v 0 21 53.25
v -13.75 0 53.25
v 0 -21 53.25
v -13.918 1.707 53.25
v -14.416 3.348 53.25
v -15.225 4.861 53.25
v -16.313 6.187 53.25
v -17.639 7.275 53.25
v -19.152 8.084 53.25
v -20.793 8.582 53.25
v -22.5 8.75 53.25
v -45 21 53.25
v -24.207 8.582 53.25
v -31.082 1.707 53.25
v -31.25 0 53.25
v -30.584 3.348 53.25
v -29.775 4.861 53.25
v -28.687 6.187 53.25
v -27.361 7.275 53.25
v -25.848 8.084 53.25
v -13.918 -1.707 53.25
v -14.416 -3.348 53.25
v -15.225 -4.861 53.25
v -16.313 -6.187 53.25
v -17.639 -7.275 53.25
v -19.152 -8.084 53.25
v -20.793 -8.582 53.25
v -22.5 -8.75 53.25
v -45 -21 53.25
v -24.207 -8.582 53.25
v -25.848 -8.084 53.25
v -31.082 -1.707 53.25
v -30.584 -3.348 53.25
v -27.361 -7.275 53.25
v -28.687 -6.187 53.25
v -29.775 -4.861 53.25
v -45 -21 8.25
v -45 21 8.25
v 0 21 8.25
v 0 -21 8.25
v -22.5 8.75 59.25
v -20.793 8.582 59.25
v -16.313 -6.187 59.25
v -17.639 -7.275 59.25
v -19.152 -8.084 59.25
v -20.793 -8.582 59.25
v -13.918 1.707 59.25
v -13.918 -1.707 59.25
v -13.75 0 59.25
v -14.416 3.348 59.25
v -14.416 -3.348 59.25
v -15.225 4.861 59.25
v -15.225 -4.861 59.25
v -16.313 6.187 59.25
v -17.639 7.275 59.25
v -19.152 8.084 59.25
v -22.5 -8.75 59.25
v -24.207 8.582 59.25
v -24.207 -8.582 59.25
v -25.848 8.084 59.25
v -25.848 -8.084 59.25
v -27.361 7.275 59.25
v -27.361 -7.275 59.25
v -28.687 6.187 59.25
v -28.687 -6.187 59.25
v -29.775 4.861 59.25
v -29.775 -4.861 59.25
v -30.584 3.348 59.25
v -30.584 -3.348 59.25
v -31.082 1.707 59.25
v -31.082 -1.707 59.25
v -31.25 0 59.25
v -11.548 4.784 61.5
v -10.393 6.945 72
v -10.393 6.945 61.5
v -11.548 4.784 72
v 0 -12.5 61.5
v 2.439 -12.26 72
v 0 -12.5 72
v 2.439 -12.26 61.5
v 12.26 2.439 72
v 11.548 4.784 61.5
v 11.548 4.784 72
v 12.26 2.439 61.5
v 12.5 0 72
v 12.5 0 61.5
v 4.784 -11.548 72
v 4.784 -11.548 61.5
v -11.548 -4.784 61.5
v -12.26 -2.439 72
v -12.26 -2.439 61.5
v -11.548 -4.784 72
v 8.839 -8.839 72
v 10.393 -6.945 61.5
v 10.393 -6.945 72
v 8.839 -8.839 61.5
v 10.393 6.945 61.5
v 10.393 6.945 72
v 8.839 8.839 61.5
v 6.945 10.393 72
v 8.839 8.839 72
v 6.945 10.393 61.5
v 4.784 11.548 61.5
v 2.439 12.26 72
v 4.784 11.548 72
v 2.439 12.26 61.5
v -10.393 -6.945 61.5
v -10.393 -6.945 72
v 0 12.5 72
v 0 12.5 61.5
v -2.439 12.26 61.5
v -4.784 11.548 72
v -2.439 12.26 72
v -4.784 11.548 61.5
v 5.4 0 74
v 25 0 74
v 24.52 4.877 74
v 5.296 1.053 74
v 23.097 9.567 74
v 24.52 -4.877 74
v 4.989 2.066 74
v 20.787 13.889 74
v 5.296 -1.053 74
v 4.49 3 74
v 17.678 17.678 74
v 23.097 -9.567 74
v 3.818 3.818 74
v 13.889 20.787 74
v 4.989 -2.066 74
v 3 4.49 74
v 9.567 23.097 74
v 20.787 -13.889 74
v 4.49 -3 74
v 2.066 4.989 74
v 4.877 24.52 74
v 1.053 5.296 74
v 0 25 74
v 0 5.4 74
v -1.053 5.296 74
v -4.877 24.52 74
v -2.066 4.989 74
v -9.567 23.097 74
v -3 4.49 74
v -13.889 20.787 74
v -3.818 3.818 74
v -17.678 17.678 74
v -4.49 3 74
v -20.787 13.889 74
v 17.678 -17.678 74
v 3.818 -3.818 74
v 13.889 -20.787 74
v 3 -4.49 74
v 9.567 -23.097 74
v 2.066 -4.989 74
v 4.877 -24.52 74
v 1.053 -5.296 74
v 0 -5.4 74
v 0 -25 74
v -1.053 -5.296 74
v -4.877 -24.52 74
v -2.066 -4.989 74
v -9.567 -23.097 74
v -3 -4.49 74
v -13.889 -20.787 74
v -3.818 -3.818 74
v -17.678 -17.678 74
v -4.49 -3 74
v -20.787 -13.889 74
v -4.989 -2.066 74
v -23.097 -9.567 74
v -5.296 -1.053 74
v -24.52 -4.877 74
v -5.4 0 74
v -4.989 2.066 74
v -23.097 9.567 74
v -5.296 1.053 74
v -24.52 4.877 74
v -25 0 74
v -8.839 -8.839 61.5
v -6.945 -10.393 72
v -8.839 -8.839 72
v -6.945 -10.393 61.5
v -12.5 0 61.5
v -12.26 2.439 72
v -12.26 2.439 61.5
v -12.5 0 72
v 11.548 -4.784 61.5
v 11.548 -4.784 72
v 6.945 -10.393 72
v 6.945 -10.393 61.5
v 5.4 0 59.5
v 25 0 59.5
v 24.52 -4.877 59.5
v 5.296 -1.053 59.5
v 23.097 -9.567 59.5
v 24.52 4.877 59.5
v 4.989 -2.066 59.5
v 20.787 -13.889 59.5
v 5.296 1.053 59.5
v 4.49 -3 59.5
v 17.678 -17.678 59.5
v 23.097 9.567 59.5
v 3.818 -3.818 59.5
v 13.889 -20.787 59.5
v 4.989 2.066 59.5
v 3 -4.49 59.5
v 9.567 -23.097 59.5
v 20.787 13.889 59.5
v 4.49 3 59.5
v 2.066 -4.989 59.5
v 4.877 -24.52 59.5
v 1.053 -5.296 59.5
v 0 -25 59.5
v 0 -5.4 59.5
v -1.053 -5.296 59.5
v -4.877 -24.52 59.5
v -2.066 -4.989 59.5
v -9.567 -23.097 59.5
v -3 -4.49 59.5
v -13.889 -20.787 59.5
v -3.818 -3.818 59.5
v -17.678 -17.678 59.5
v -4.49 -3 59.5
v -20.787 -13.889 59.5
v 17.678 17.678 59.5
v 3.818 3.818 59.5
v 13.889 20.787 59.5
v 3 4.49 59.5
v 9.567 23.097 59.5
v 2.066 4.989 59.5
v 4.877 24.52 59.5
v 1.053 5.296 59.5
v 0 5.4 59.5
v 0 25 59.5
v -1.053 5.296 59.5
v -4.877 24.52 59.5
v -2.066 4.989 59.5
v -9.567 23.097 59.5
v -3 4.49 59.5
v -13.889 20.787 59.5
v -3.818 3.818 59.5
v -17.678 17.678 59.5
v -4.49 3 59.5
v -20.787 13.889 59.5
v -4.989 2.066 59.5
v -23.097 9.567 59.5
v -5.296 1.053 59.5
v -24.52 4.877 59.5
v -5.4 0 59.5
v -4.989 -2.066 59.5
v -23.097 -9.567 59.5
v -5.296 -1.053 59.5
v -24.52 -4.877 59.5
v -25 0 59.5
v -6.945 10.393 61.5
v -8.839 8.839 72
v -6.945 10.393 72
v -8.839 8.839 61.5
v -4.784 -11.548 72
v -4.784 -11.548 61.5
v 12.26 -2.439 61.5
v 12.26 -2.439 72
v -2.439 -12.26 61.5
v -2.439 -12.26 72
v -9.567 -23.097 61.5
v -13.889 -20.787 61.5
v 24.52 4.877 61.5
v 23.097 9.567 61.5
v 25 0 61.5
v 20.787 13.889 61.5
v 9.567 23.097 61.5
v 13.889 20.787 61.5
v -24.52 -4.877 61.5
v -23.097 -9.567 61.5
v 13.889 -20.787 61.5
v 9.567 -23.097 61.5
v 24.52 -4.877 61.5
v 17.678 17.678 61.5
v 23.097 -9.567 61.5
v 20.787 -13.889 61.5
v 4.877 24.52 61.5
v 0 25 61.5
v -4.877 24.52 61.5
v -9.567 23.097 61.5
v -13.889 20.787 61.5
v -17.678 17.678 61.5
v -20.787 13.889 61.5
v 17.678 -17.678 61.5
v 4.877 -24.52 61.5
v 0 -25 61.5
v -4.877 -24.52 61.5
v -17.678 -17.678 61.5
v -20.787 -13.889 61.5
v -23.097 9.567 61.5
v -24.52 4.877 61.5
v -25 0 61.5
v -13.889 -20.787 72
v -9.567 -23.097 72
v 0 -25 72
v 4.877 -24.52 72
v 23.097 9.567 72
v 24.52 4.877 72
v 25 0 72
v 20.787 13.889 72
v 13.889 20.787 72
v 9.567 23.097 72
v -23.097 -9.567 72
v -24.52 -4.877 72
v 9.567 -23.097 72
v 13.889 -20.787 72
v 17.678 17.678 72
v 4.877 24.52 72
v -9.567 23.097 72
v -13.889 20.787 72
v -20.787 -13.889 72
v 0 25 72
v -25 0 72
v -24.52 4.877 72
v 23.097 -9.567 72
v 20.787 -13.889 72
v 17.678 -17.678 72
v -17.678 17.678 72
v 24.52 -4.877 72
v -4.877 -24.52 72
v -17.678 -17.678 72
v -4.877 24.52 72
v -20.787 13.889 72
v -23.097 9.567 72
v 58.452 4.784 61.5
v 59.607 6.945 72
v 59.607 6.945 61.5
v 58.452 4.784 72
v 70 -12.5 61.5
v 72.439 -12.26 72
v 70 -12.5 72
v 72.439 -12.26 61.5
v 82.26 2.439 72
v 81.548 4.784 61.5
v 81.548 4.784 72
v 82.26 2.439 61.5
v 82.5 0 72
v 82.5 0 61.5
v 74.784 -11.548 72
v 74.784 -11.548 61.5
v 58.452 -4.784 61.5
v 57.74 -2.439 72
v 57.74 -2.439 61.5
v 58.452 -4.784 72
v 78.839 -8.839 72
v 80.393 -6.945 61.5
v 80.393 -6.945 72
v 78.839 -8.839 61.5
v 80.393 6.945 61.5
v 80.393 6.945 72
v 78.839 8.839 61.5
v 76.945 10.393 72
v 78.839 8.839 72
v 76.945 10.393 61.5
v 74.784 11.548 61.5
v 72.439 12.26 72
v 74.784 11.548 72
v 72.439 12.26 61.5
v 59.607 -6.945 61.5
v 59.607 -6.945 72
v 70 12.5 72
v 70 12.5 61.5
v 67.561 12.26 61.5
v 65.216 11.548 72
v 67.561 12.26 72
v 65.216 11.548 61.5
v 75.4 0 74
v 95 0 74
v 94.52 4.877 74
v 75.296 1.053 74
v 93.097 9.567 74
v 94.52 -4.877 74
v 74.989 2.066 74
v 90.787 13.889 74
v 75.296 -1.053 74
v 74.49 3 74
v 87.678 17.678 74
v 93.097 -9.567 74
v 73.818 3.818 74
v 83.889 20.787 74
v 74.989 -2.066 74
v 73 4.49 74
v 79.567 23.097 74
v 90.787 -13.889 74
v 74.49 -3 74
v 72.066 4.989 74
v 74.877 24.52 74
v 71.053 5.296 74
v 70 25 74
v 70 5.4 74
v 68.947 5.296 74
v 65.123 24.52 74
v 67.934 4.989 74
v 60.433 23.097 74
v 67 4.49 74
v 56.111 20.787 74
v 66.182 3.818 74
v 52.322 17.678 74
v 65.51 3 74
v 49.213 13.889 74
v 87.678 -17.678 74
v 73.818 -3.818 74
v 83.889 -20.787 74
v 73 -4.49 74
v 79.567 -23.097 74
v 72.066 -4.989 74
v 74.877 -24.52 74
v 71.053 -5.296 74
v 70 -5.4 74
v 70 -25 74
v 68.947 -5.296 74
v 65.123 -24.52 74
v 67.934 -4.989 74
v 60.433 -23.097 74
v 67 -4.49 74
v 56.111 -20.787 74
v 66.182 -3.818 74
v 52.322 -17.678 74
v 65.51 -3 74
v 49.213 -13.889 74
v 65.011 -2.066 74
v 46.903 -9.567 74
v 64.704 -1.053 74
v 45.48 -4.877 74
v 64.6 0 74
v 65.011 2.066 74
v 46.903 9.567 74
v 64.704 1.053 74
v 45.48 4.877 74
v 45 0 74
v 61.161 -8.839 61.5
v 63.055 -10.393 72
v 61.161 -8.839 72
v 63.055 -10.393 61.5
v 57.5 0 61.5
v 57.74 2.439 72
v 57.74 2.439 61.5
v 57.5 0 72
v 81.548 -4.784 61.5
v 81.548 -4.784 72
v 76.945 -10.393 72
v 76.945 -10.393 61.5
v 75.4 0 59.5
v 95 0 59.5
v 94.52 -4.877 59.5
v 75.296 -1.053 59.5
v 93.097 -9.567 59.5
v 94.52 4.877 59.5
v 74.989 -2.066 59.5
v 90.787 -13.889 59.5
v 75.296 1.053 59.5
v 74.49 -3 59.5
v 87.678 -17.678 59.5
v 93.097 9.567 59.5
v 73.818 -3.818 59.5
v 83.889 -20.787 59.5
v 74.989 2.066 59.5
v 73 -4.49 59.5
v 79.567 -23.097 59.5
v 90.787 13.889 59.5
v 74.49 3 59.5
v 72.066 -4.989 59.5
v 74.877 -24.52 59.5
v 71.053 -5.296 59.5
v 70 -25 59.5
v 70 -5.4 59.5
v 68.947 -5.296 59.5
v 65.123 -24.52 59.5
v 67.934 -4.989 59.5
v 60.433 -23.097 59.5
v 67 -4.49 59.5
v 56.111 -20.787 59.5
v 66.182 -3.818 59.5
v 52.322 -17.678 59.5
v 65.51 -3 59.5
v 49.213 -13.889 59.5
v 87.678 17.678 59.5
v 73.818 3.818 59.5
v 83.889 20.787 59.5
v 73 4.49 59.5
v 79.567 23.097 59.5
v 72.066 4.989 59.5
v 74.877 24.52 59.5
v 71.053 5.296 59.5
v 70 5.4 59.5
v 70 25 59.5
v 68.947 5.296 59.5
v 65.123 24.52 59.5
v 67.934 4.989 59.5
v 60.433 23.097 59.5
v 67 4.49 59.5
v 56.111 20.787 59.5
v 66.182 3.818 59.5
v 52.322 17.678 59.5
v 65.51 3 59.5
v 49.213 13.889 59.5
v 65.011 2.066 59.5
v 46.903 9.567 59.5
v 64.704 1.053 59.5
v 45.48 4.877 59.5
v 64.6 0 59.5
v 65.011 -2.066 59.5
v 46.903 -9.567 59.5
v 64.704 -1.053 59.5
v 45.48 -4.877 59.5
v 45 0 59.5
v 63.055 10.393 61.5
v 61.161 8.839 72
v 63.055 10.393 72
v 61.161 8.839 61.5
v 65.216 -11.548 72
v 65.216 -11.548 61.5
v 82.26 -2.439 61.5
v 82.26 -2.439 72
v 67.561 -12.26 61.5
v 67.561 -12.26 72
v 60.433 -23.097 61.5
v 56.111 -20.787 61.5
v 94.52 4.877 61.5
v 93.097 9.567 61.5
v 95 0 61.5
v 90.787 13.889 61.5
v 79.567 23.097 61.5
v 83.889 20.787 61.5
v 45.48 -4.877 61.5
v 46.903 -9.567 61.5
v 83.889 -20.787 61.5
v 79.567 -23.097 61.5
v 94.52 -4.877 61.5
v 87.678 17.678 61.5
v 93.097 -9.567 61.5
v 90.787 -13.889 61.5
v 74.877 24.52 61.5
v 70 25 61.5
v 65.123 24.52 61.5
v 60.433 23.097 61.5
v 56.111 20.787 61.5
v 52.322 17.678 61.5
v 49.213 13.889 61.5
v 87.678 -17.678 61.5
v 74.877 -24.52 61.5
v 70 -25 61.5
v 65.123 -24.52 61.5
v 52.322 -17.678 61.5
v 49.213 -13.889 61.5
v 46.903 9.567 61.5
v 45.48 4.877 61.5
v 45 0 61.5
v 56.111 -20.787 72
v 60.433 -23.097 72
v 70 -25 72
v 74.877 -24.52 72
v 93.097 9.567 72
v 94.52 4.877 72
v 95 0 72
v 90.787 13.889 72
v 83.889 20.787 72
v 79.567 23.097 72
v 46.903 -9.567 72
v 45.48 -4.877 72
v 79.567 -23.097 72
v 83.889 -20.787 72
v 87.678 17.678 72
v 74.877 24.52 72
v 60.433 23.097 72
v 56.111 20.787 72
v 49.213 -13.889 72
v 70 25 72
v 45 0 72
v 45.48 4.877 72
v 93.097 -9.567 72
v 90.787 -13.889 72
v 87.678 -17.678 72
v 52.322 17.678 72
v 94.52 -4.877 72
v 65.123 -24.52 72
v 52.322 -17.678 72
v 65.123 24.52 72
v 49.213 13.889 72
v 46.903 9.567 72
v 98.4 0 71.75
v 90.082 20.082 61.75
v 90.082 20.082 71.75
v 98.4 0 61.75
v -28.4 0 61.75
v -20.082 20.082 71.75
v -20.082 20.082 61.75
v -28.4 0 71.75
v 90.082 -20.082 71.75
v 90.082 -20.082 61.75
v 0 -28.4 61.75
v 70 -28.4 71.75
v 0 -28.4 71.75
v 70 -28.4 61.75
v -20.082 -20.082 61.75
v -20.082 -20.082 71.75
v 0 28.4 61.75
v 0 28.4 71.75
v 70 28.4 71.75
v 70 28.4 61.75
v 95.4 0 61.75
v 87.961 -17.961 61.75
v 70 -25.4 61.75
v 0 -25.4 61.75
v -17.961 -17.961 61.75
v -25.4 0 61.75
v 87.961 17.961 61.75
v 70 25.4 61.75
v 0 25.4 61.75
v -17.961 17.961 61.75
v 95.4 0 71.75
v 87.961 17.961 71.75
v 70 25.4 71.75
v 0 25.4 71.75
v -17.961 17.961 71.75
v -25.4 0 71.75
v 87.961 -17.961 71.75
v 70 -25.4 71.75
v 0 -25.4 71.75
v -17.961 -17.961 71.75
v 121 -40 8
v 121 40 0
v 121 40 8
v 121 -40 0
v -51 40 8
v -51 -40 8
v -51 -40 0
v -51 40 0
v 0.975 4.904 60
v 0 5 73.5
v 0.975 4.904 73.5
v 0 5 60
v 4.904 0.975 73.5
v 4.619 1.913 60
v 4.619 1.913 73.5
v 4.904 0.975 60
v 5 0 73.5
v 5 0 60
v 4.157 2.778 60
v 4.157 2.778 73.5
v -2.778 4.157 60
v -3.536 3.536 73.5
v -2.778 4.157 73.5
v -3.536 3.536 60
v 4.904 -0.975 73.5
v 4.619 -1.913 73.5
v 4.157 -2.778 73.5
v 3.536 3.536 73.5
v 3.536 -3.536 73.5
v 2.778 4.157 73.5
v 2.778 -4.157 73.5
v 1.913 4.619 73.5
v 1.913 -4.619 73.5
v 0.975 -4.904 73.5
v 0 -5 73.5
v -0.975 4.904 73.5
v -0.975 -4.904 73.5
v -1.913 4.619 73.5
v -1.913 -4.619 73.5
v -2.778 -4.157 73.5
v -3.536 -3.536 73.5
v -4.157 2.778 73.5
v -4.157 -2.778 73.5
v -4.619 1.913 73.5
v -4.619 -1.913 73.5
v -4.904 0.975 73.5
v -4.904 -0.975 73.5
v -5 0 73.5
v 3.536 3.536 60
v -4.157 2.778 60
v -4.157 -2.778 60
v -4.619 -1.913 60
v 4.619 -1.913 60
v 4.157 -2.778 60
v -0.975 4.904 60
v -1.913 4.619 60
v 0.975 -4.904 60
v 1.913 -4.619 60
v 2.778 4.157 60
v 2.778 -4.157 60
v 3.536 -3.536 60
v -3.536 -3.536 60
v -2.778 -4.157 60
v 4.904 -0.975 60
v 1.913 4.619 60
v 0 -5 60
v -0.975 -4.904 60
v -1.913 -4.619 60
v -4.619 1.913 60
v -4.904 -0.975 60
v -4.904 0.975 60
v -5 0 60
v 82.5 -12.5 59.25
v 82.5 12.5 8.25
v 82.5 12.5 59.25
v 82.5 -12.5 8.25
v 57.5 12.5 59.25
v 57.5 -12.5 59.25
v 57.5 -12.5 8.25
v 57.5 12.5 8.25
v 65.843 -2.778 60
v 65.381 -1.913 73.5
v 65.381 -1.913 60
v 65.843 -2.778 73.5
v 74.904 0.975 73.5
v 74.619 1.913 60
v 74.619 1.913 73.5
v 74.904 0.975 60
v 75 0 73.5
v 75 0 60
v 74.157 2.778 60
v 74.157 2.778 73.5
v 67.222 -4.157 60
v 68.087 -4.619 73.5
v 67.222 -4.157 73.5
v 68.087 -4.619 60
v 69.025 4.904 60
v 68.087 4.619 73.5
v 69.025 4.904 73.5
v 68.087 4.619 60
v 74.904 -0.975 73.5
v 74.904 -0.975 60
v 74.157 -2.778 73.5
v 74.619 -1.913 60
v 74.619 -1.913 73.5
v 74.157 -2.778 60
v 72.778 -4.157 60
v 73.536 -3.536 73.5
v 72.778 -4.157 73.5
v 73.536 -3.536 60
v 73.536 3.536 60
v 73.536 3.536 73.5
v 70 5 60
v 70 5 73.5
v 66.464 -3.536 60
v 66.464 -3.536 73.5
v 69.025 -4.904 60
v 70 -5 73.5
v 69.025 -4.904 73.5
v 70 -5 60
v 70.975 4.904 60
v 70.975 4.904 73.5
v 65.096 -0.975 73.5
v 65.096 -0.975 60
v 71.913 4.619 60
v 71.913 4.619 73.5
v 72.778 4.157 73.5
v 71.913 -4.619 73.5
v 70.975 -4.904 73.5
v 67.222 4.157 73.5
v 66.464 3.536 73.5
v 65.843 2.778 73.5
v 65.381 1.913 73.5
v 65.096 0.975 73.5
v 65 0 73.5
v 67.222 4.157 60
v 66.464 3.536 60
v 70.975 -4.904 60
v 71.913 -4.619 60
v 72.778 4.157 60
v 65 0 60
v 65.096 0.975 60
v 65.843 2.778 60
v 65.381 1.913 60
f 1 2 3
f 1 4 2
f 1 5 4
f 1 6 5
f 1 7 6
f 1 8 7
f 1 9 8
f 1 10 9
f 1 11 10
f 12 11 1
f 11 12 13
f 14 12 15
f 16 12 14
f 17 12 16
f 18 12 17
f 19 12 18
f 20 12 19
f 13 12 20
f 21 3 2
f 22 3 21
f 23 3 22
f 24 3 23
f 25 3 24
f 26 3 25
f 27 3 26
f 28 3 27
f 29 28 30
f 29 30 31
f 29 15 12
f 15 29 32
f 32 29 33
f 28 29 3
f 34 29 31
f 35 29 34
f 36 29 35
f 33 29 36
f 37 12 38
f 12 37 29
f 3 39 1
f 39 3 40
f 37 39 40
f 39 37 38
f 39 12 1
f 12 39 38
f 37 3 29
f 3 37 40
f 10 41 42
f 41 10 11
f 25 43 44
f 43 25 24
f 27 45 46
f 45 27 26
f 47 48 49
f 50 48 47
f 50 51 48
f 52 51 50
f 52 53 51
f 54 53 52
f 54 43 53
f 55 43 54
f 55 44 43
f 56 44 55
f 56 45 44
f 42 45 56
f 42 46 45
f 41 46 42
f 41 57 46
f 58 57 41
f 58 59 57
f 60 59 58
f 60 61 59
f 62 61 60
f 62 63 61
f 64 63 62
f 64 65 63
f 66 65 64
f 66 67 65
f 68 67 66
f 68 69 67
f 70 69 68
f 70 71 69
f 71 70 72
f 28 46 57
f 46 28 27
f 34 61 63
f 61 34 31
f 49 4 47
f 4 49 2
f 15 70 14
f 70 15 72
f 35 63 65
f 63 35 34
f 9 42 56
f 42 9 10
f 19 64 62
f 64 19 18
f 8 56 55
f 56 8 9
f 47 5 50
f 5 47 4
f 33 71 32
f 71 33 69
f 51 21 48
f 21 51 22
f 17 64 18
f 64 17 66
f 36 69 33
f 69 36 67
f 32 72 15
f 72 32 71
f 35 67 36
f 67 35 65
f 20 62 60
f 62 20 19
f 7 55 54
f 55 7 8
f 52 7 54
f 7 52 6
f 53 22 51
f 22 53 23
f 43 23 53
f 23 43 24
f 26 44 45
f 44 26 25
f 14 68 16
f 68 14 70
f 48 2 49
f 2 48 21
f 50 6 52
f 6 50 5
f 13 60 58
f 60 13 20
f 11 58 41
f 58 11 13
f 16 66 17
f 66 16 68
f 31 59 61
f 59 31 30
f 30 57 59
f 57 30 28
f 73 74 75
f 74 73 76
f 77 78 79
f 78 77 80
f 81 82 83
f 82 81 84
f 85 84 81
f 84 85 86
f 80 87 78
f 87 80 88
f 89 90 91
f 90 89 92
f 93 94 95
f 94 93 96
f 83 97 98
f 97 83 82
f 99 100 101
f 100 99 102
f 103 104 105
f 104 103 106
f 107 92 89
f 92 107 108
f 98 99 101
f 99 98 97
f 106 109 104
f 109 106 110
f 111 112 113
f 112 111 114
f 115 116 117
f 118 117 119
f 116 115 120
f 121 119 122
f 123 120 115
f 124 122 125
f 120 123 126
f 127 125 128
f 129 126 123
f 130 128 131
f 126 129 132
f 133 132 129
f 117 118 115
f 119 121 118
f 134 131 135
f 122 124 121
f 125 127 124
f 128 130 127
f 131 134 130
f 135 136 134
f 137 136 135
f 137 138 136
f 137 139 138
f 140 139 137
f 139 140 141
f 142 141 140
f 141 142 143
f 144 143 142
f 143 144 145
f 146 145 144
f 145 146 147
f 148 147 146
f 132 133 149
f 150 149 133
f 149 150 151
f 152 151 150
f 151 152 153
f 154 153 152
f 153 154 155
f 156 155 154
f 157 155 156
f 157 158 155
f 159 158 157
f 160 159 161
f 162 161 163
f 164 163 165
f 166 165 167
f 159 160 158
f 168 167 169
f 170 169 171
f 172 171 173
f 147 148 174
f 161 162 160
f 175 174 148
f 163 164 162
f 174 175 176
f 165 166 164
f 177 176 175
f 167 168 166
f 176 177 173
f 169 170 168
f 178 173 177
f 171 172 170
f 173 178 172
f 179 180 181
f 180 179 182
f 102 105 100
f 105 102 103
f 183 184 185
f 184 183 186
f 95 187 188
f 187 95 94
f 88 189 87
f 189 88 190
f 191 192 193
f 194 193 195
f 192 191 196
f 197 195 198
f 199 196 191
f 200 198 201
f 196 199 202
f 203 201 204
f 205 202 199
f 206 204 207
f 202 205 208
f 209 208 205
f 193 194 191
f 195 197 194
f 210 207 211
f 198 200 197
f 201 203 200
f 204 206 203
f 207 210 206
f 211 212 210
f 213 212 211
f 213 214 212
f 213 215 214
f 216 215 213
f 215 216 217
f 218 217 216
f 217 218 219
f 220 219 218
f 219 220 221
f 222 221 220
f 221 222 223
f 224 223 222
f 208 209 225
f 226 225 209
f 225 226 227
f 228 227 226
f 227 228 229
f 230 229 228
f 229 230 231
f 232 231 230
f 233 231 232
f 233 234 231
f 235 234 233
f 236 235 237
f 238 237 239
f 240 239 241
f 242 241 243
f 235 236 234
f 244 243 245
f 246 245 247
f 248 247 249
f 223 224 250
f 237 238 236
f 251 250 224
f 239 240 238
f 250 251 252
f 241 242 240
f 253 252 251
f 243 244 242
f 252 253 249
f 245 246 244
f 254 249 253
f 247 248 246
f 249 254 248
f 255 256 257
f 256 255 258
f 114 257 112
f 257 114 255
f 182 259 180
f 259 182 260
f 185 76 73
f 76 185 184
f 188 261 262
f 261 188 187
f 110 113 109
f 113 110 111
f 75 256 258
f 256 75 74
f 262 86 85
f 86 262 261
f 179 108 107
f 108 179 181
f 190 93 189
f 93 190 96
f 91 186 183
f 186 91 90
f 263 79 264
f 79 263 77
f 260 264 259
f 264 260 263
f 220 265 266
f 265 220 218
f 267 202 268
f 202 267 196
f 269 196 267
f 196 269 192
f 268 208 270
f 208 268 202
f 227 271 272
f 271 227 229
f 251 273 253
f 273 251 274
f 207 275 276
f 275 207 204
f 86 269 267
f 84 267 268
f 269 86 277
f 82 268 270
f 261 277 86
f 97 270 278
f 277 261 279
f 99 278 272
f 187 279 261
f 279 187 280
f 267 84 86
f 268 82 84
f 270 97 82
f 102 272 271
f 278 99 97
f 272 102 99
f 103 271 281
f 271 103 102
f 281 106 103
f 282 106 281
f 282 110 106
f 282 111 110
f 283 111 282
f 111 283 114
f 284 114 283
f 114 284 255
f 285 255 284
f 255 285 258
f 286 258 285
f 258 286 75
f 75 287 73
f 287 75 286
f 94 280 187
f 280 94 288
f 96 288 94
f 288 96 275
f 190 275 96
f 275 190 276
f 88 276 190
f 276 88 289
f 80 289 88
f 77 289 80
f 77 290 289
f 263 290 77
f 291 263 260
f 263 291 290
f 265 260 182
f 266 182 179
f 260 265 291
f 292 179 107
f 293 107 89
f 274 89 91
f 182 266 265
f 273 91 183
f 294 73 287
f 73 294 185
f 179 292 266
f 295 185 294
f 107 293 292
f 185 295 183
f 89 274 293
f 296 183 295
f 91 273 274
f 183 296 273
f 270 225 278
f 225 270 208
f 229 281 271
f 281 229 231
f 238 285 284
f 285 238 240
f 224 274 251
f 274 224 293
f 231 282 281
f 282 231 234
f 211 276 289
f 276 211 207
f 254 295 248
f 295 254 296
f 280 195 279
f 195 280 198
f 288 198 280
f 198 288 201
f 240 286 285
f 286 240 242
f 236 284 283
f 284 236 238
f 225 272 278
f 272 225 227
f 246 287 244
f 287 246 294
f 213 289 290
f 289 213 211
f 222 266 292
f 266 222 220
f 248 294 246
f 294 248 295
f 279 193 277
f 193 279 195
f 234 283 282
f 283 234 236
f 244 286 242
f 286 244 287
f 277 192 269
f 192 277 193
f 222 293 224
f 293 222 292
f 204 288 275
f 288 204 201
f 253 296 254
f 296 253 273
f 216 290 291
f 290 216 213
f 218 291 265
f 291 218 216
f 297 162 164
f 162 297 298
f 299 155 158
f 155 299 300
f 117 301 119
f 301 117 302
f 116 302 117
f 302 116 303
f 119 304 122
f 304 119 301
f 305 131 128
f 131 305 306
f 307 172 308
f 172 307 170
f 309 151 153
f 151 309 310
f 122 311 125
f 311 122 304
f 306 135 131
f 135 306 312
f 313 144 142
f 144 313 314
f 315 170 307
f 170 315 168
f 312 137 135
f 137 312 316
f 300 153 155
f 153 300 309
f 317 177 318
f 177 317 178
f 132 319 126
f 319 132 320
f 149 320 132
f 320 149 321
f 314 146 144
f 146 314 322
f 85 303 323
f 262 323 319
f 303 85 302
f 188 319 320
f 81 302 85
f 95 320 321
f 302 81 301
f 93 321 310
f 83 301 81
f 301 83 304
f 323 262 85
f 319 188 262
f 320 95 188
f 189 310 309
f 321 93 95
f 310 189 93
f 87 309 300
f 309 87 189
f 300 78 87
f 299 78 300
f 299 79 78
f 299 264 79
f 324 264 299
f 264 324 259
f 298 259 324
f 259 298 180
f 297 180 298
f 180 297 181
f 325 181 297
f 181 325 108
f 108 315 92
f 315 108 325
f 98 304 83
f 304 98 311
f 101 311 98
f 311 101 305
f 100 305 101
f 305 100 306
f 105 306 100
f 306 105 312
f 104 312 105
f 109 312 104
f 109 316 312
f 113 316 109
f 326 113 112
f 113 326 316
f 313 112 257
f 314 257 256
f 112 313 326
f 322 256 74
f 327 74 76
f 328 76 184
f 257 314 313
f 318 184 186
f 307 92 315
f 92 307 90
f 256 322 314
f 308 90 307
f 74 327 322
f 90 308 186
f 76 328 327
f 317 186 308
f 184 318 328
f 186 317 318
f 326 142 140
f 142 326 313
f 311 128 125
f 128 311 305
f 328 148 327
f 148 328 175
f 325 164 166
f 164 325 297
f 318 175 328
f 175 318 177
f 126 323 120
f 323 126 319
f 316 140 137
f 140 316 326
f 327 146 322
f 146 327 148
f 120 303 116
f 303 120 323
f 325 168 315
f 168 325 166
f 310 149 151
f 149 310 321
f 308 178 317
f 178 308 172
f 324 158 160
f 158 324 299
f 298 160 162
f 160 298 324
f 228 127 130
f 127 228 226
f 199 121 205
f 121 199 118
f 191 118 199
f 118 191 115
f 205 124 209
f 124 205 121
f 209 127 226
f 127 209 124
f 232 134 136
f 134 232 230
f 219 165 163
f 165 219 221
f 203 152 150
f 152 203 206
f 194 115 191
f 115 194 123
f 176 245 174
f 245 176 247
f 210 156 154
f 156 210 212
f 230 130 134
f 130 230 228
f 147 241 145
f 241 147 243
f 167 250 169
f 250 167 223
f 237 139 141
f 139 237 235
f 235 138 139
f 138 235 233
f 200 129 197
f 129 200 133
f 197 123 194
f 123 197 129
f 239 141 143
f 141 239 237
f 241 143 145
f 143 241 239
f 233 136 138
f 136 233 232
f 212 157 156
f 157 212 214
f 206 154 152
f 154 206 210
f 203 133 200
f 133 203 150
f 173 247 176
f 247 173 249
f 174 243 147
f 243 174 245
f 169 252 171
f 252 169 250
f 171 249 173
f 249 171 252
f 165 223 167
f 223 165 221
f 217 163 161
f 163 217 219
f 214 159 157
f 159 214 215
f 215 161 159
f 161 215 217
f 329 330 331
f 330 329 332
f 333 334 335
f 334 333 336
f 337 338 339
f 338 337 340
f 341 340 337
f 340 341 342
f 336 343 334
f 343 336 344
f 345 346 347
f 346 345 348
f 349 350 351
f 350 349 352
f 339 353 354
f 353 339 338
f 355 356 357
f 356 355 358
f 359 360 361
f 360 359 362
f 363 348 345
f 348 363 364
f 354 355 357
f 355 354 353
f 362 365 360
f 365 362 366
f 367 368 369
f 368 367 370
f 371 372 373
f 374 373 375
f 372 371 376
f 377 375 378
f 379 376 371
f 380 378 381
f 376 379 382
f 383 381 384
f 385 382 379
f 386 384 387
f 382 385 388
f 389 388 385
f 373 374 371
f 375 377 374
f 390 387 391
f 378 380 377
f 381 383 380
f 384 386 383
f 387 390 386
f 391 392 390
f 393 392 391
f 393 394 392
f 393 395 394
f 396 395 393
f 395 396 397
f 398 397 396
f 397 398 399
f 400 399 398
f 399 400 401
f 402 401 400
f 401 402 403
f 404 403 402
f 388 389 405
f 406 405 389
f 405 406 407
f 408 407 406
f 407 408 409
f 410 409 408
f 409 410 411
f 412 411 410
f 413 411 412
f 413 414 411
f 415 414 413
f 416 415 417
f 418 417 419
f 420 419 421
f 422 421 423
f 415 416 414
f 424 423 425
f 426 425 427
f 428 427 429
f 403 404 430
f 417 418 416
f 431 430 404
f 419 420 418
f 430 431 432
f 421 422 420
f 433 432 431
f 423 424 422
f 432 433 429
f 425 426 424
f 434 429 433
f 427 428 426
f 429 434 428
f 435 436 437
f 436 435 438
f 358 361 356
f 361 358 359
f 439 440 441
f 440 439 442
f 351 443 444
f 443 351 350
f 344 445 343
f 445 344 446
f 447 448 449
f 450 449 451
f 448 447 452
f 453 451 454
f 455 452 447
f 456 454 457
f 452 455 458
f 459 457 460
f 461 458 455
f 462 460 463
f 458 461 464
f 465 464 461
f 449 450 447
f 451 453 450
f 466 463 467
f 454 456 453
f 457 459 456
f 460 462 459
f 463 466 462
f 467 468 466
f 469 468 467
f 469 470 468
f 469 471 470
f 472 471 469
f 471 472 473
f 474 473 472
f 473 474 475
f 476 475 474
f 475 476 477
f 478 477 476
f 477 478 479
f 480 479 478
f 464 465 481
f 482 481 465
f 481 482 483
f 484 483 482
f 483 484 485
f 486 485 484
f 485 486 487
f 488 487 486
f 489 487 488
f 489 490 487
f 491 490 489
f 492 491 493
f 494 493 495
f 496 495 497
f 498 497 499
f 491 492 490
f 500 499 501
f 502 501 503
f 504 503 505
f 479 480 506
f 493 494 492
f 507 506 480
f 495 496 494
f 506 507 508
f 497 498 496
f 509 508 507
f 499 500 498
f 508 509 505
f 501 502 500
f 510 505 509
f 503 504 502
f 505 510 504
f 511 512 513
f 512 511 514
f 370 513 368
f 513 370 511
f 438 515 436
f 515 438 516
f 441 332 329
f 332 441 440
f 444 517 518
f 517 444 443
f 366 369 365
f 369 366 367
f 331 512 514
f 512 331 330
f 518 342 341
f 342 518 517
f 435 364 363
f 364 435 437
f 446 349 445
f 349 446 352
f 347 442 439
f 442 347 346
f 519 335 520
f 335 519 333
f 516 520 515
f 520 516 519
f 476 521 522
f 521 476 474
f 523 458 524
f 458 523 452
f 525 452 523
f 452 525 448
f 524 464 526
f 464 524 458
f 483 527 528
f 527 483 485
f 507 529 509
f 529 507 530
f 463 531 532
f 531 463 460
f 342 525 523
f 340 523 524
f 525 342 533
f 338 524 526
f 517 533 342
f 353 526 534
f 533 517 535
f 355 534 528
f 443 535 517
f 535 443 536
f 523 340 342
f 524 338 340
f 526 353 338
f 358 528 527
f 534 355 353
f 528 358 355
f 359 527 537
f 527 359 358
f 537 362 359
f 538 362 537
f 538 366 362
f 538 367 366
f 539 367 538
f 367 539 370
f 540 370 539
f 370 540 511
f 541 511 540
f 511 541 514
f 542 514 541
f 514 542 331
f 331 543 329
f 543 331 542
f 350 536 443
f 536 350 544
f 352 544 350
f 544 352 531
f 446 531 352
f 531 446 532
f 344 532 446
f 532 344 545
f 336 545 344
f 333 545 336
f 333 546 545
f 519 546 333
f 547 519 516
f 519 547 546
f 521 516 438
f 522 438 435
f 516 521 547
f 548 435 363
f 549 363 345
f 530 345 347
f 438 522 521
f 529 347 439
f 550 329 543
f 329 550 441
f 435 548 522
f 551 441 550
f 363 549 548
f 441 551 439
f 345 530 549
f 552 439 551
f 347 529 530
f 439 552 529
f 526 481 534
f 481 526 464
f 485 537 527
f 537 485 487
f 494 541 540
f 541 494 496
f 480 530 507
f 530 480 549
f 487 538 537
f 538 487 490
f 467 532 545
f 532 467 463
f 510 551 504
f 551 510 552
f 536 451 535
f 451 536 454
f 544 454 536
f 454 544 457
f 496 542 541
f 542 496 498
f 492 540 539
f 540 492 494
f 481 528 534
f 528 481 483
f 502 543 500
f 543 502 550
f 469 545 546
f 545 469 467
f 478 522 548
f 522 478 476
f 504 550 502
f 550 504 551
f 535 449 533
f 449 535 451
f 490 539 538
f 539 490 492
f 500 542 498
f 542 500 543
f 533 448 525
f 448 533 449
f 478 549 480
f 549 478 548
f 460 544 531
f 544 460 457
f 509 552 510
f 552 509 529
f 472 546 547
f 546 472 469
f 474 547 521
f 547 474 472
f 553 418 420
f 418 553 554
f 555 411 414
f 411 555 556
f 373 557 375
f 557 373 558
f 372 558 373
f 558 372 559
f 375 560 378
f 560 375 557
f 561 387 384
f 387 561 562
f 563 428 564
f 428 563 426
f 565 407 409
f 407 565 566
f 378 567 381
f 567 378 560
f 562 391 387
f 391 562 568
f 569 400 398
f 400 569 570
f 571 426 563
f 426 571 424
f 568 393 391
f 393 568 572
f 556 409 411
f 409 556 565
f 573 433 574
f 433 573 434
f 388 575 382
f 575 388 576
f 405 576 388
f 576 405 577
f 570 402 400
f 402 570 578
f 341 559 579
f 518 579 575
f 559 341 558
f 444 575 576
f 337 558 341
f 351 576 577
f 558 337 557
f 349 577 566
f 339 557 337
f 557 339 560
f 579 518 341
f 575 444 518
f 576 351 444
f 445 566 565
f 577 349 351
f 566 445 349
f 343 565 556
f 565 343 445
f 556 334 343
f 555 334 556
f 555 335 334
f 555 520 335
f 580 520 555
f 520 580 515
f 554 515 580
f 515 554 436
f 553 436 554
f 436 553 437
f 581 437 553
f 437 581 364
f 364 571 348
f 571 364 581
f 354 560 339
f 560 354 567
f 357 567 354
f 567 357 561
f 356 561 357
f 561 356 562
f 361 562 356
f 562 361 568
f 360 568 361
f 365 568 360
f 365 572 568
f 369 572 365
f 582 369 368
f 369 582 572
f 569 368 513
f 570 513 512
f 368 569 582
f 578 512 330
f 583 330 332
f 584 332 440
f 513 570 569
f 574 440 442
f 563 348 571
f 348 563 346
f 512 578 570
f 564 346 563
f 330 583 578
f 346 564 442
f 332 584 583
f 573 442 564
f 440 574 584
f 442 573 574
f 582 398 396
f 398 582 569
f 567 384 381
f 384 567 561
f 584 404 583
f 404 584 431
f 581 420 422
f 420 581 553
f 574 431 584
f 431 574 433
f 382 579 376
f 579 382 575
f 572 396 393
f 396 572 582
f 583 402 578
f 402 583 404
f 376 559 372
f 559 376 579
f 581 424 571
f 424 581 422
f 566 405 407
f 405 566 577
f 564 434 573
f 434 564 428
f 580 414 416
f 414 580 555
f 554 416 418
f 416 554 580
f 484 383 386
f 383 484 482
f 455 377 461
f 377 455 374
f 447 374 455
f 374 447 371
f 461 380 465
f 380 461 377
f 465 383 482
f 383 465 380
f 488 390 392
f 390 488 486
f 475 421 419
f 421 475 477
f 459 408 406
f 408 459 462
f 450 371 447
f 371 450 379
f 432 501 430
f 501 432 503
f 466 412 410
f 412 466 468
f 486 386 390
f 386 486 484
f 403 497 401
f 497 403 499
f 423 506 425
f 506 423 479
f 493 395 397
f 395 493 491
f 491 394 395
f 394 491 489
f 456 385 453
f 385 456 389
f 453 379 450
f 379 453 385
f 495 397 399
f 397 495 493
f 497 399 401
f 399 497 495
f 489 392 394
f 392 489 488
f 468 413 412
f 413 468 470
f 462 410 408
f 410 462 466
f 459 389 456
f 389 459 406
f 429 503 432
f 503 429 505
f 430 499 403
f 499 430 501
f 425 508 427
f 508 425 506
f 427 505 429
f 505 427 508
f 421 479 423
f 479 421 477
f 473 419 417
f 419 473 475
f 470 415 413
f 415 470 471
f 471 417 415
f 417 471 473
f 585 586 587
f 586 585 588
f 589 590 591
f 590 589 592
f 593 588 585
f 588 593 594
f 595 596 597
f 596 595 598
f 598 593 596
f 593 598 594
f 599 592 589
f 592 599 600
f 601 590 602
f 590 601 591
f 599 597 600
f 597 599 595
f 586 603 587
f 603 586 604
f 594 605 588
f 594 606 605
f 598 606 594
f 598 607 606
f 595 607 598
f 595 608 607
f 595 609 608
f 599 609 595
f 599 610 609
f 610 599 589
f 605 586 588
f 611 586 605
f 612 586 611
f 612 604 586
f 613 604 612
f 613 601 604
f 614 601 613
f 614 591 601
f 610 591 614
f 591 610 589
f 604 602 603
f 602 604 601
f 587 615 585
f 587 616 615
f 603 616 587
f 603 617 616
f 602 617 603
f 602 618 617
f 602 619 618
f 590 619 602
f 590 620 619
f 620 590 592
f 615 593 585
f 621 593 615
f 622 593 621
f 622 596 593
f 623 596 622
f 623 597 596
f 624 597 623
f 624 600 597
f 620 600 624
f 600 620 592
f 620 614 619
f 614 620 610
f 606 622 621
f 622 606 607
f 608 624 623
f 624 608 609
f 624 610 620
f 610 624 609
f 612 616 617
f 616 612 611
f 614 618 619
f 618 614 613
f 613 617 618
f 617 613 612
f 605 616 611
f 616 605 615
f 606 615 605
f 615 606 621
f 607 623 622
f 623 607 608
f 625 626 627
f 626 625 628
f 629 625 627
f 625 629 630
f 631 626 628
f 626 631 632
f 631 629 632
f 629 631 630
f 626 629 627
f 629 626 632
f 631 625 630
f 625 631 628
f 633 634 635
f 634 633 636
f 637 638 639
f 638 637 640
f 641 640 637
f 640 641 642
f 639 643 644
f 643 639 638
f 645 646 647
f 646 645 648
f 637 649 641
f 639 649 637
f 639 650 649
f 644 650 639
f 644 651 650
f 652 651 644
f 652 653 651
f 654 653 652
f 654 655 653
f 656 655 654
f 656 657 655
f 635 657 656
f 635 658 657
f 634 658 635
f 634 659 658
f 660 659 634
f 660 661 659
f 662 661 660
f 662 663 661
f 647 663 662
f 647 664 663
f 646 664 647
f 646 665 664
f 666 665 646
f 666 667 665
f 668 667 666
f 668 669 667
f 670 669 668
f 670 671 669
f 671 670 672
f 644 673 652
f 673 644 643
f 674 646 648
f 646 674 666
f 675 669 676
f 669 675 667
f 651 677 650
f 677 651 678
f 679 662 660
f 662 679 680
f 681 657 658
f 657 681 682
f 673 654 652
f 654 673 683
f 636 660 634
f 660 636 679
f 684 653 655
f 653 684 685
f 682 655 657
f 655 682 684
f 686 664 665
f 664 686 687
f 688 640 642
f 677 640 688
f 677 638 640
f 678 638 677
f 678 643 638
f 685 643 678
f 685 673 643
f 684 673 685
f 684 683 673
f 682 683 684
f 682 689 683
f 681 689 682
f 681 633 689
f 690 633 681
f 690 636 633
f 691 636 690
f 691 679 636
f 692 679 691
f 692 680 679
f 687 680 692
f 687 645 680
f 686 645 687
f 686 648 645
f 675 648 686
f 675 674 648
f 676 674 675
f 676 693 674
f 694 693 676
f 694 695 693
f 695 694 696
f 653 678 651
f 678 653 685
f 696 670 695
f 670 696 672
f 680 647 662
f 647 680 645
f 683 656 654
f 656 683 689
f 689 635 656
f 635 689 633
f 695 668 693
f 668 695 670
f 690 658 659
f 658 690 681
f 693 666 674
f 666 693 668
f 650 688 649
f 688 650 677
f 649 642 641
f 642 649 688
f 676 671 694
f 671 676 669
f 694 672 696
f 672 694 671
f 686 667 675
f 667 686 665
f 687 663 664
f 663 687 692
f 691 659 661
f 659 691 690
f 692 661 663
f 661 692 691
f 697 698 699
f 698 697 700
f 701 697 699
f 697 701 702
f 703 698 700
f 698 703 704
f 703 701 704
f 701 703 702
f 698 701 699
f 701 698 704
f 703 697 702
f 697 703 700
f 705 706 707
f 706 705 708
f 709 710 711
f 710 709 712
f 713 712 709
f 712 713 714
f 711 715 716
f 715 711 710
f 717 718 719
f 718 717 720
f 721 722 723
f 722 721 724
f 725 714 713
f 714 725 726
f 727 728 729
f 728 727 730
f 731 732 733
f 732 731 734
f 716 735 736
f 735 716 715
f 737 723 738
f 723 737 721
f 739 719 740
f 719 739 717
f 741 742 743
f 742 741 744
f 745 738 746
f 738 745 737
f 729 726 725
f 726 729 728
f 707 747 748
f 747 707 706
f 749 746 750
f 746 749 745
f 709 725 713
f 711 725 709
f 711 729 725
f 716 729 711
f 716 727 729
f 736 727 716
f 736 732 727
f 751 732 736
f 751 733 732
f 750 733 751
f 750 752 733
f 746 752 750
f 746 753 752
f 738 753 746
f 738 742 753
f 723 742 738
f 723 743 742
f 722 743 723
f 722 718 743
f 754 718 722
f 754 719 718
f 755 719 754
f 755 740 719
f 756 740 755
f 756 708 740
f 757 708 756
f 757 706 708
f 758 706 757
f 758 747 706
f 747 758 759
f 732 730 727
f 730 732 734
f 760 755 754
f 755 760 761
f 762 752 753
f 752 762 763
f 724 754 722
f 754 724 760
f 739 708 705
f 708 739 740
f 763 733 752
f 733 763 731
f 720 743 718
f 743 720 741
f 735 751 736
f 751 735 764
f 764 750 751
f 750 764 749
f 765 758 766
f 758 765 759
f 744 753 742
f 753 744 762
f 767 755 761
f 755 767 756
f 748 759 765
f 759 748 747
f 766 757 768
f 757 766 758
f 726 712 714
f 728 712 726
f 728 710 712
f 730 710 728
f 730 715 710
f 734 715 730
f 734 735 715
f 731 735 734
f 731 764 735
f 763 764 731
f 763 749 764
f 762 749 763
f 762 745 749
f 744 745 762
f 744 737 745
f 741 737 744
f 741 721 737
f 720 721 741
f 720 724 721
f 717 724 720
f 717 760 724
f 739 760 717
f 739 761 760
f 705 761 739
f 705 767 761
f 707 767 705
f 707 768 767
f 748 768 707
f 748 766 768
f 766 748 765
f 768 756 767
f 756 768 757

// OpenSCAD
$fn = 32;

// ------------------------------------------------------------------------
// Motor belt drive: span 70 mm, pulleys d50, belt 10 mm wide
// Every part is its own module, assembly() places every instance.
// ------------------------------------------------------------------------

// --- part 1 ---
module base_plate() {
  difference() {
    translate([-86, -40, 0]) cube([172, 80, 8]);
  }
}

// --- part 2 ---
module motor() {
  union() {
    translate([-22.5, -21, 0]) cube([45, 42, 45]);
    translate([25.5, 0, 22.5]) rotate([0, 90, 0]) cylinder(h = 6, d = 17.5, center = true);
  }
}

// --- part 3 ---
module drive_shaft() {
  translate([0, 0, -6.75]) cylinder(h = 13.5, d = 10);
}

// --- part 4 ---
module pulley_drive() {
  difference() {
    union() {
      cylinder(h = 14.5, d = 25);
      cylinder(h = 2, d = 50);
      translate([0, 0, 12.5]) cylinder(h = 2, d = 50);
    }
    translate([0, 0, -1]) cylinder(h = 16.5, d = 10.8);
  }
}

// --- part 5 ---
module idler_post() {
  translate([-12.5, -12.5, 0]) cube([25, 25, 51]);
}

// --- part 6 ---
module driven_shaft() {
  translate([0, 0, -6.75]) cylinder(h = 13.5, d = 10);
}

// --- part 7 ---
module pulley_driven() {
  difference() {
    union() {
      cylinder(h = 14.5, d = 25);
      cylinder(h = 2, d = 50);
      translate([0, 0, 12.5]) cylinder(h = 2, d = 50);
    }
    translate([0, 0, -1]) cylinder(h = 16.5, d = 10.8);
  }
}

// --- part 8 ---
module drive_belt() {
  difference() {
    linear_extrude(height = 10) polygon(points = concat([for (a = [90 : 45 : 270]) [28.4 * cos(a), 28.4 * sin(a)]], [for (a = [270 : 45 : 450]) [70 + 28.4 * cos(a), 28.4 * sin(a)]]));
    translate([0, 0, -1]) linear_extrude(height = 12) polygon(points = concat([for (a = [90 : 45 : 270]) [25.4 * cos(a), 25.4 * sin(a)]], [for (a = [270 : 45 : 450]) [70 + 25.4 * cos(a), 25.4 * sin(a)]]));
  }
}

// --- assembly ---
module assembly() {
  color([0.80, 0.24, 0.20]) translate([35, 0, 0]) rotate([0, 0, 0]) base_plate();
  color([0.20, 0.45, 0.75]) translate([0, 0, 30.75]) rotate([0, 270, 0]) motor();
  color([0.25, 0.62, 0.32]) translate([0, 0, 66.75]) rotate([0, 0, 0]) drive_shaft();
  color([0.92, 0.70, 0.18]) translate([0, 0, 59.5]) rotate([0, 0, 0]) pulley_drive();
  color([0.58, 0.35, 0.70]) translate([70, 0, 8.25]) rotate([0, 0, 0]) idler_post();
  color([0.16, 0.66, 0.66]) translate([70, 0, 66.75]) rotate([0, 0, 0]) driven_shaft();
  color([0.85, 0.48, 0.18]) translate([70, 0, 59.5]) rotate([0, 0, 0]) pulley_driven();
  color([0.55, 0.60, 0.65]) translate([0, 0, 61.75]) rotate([0, 0, 0]) drive_belt();
}

assembly();
